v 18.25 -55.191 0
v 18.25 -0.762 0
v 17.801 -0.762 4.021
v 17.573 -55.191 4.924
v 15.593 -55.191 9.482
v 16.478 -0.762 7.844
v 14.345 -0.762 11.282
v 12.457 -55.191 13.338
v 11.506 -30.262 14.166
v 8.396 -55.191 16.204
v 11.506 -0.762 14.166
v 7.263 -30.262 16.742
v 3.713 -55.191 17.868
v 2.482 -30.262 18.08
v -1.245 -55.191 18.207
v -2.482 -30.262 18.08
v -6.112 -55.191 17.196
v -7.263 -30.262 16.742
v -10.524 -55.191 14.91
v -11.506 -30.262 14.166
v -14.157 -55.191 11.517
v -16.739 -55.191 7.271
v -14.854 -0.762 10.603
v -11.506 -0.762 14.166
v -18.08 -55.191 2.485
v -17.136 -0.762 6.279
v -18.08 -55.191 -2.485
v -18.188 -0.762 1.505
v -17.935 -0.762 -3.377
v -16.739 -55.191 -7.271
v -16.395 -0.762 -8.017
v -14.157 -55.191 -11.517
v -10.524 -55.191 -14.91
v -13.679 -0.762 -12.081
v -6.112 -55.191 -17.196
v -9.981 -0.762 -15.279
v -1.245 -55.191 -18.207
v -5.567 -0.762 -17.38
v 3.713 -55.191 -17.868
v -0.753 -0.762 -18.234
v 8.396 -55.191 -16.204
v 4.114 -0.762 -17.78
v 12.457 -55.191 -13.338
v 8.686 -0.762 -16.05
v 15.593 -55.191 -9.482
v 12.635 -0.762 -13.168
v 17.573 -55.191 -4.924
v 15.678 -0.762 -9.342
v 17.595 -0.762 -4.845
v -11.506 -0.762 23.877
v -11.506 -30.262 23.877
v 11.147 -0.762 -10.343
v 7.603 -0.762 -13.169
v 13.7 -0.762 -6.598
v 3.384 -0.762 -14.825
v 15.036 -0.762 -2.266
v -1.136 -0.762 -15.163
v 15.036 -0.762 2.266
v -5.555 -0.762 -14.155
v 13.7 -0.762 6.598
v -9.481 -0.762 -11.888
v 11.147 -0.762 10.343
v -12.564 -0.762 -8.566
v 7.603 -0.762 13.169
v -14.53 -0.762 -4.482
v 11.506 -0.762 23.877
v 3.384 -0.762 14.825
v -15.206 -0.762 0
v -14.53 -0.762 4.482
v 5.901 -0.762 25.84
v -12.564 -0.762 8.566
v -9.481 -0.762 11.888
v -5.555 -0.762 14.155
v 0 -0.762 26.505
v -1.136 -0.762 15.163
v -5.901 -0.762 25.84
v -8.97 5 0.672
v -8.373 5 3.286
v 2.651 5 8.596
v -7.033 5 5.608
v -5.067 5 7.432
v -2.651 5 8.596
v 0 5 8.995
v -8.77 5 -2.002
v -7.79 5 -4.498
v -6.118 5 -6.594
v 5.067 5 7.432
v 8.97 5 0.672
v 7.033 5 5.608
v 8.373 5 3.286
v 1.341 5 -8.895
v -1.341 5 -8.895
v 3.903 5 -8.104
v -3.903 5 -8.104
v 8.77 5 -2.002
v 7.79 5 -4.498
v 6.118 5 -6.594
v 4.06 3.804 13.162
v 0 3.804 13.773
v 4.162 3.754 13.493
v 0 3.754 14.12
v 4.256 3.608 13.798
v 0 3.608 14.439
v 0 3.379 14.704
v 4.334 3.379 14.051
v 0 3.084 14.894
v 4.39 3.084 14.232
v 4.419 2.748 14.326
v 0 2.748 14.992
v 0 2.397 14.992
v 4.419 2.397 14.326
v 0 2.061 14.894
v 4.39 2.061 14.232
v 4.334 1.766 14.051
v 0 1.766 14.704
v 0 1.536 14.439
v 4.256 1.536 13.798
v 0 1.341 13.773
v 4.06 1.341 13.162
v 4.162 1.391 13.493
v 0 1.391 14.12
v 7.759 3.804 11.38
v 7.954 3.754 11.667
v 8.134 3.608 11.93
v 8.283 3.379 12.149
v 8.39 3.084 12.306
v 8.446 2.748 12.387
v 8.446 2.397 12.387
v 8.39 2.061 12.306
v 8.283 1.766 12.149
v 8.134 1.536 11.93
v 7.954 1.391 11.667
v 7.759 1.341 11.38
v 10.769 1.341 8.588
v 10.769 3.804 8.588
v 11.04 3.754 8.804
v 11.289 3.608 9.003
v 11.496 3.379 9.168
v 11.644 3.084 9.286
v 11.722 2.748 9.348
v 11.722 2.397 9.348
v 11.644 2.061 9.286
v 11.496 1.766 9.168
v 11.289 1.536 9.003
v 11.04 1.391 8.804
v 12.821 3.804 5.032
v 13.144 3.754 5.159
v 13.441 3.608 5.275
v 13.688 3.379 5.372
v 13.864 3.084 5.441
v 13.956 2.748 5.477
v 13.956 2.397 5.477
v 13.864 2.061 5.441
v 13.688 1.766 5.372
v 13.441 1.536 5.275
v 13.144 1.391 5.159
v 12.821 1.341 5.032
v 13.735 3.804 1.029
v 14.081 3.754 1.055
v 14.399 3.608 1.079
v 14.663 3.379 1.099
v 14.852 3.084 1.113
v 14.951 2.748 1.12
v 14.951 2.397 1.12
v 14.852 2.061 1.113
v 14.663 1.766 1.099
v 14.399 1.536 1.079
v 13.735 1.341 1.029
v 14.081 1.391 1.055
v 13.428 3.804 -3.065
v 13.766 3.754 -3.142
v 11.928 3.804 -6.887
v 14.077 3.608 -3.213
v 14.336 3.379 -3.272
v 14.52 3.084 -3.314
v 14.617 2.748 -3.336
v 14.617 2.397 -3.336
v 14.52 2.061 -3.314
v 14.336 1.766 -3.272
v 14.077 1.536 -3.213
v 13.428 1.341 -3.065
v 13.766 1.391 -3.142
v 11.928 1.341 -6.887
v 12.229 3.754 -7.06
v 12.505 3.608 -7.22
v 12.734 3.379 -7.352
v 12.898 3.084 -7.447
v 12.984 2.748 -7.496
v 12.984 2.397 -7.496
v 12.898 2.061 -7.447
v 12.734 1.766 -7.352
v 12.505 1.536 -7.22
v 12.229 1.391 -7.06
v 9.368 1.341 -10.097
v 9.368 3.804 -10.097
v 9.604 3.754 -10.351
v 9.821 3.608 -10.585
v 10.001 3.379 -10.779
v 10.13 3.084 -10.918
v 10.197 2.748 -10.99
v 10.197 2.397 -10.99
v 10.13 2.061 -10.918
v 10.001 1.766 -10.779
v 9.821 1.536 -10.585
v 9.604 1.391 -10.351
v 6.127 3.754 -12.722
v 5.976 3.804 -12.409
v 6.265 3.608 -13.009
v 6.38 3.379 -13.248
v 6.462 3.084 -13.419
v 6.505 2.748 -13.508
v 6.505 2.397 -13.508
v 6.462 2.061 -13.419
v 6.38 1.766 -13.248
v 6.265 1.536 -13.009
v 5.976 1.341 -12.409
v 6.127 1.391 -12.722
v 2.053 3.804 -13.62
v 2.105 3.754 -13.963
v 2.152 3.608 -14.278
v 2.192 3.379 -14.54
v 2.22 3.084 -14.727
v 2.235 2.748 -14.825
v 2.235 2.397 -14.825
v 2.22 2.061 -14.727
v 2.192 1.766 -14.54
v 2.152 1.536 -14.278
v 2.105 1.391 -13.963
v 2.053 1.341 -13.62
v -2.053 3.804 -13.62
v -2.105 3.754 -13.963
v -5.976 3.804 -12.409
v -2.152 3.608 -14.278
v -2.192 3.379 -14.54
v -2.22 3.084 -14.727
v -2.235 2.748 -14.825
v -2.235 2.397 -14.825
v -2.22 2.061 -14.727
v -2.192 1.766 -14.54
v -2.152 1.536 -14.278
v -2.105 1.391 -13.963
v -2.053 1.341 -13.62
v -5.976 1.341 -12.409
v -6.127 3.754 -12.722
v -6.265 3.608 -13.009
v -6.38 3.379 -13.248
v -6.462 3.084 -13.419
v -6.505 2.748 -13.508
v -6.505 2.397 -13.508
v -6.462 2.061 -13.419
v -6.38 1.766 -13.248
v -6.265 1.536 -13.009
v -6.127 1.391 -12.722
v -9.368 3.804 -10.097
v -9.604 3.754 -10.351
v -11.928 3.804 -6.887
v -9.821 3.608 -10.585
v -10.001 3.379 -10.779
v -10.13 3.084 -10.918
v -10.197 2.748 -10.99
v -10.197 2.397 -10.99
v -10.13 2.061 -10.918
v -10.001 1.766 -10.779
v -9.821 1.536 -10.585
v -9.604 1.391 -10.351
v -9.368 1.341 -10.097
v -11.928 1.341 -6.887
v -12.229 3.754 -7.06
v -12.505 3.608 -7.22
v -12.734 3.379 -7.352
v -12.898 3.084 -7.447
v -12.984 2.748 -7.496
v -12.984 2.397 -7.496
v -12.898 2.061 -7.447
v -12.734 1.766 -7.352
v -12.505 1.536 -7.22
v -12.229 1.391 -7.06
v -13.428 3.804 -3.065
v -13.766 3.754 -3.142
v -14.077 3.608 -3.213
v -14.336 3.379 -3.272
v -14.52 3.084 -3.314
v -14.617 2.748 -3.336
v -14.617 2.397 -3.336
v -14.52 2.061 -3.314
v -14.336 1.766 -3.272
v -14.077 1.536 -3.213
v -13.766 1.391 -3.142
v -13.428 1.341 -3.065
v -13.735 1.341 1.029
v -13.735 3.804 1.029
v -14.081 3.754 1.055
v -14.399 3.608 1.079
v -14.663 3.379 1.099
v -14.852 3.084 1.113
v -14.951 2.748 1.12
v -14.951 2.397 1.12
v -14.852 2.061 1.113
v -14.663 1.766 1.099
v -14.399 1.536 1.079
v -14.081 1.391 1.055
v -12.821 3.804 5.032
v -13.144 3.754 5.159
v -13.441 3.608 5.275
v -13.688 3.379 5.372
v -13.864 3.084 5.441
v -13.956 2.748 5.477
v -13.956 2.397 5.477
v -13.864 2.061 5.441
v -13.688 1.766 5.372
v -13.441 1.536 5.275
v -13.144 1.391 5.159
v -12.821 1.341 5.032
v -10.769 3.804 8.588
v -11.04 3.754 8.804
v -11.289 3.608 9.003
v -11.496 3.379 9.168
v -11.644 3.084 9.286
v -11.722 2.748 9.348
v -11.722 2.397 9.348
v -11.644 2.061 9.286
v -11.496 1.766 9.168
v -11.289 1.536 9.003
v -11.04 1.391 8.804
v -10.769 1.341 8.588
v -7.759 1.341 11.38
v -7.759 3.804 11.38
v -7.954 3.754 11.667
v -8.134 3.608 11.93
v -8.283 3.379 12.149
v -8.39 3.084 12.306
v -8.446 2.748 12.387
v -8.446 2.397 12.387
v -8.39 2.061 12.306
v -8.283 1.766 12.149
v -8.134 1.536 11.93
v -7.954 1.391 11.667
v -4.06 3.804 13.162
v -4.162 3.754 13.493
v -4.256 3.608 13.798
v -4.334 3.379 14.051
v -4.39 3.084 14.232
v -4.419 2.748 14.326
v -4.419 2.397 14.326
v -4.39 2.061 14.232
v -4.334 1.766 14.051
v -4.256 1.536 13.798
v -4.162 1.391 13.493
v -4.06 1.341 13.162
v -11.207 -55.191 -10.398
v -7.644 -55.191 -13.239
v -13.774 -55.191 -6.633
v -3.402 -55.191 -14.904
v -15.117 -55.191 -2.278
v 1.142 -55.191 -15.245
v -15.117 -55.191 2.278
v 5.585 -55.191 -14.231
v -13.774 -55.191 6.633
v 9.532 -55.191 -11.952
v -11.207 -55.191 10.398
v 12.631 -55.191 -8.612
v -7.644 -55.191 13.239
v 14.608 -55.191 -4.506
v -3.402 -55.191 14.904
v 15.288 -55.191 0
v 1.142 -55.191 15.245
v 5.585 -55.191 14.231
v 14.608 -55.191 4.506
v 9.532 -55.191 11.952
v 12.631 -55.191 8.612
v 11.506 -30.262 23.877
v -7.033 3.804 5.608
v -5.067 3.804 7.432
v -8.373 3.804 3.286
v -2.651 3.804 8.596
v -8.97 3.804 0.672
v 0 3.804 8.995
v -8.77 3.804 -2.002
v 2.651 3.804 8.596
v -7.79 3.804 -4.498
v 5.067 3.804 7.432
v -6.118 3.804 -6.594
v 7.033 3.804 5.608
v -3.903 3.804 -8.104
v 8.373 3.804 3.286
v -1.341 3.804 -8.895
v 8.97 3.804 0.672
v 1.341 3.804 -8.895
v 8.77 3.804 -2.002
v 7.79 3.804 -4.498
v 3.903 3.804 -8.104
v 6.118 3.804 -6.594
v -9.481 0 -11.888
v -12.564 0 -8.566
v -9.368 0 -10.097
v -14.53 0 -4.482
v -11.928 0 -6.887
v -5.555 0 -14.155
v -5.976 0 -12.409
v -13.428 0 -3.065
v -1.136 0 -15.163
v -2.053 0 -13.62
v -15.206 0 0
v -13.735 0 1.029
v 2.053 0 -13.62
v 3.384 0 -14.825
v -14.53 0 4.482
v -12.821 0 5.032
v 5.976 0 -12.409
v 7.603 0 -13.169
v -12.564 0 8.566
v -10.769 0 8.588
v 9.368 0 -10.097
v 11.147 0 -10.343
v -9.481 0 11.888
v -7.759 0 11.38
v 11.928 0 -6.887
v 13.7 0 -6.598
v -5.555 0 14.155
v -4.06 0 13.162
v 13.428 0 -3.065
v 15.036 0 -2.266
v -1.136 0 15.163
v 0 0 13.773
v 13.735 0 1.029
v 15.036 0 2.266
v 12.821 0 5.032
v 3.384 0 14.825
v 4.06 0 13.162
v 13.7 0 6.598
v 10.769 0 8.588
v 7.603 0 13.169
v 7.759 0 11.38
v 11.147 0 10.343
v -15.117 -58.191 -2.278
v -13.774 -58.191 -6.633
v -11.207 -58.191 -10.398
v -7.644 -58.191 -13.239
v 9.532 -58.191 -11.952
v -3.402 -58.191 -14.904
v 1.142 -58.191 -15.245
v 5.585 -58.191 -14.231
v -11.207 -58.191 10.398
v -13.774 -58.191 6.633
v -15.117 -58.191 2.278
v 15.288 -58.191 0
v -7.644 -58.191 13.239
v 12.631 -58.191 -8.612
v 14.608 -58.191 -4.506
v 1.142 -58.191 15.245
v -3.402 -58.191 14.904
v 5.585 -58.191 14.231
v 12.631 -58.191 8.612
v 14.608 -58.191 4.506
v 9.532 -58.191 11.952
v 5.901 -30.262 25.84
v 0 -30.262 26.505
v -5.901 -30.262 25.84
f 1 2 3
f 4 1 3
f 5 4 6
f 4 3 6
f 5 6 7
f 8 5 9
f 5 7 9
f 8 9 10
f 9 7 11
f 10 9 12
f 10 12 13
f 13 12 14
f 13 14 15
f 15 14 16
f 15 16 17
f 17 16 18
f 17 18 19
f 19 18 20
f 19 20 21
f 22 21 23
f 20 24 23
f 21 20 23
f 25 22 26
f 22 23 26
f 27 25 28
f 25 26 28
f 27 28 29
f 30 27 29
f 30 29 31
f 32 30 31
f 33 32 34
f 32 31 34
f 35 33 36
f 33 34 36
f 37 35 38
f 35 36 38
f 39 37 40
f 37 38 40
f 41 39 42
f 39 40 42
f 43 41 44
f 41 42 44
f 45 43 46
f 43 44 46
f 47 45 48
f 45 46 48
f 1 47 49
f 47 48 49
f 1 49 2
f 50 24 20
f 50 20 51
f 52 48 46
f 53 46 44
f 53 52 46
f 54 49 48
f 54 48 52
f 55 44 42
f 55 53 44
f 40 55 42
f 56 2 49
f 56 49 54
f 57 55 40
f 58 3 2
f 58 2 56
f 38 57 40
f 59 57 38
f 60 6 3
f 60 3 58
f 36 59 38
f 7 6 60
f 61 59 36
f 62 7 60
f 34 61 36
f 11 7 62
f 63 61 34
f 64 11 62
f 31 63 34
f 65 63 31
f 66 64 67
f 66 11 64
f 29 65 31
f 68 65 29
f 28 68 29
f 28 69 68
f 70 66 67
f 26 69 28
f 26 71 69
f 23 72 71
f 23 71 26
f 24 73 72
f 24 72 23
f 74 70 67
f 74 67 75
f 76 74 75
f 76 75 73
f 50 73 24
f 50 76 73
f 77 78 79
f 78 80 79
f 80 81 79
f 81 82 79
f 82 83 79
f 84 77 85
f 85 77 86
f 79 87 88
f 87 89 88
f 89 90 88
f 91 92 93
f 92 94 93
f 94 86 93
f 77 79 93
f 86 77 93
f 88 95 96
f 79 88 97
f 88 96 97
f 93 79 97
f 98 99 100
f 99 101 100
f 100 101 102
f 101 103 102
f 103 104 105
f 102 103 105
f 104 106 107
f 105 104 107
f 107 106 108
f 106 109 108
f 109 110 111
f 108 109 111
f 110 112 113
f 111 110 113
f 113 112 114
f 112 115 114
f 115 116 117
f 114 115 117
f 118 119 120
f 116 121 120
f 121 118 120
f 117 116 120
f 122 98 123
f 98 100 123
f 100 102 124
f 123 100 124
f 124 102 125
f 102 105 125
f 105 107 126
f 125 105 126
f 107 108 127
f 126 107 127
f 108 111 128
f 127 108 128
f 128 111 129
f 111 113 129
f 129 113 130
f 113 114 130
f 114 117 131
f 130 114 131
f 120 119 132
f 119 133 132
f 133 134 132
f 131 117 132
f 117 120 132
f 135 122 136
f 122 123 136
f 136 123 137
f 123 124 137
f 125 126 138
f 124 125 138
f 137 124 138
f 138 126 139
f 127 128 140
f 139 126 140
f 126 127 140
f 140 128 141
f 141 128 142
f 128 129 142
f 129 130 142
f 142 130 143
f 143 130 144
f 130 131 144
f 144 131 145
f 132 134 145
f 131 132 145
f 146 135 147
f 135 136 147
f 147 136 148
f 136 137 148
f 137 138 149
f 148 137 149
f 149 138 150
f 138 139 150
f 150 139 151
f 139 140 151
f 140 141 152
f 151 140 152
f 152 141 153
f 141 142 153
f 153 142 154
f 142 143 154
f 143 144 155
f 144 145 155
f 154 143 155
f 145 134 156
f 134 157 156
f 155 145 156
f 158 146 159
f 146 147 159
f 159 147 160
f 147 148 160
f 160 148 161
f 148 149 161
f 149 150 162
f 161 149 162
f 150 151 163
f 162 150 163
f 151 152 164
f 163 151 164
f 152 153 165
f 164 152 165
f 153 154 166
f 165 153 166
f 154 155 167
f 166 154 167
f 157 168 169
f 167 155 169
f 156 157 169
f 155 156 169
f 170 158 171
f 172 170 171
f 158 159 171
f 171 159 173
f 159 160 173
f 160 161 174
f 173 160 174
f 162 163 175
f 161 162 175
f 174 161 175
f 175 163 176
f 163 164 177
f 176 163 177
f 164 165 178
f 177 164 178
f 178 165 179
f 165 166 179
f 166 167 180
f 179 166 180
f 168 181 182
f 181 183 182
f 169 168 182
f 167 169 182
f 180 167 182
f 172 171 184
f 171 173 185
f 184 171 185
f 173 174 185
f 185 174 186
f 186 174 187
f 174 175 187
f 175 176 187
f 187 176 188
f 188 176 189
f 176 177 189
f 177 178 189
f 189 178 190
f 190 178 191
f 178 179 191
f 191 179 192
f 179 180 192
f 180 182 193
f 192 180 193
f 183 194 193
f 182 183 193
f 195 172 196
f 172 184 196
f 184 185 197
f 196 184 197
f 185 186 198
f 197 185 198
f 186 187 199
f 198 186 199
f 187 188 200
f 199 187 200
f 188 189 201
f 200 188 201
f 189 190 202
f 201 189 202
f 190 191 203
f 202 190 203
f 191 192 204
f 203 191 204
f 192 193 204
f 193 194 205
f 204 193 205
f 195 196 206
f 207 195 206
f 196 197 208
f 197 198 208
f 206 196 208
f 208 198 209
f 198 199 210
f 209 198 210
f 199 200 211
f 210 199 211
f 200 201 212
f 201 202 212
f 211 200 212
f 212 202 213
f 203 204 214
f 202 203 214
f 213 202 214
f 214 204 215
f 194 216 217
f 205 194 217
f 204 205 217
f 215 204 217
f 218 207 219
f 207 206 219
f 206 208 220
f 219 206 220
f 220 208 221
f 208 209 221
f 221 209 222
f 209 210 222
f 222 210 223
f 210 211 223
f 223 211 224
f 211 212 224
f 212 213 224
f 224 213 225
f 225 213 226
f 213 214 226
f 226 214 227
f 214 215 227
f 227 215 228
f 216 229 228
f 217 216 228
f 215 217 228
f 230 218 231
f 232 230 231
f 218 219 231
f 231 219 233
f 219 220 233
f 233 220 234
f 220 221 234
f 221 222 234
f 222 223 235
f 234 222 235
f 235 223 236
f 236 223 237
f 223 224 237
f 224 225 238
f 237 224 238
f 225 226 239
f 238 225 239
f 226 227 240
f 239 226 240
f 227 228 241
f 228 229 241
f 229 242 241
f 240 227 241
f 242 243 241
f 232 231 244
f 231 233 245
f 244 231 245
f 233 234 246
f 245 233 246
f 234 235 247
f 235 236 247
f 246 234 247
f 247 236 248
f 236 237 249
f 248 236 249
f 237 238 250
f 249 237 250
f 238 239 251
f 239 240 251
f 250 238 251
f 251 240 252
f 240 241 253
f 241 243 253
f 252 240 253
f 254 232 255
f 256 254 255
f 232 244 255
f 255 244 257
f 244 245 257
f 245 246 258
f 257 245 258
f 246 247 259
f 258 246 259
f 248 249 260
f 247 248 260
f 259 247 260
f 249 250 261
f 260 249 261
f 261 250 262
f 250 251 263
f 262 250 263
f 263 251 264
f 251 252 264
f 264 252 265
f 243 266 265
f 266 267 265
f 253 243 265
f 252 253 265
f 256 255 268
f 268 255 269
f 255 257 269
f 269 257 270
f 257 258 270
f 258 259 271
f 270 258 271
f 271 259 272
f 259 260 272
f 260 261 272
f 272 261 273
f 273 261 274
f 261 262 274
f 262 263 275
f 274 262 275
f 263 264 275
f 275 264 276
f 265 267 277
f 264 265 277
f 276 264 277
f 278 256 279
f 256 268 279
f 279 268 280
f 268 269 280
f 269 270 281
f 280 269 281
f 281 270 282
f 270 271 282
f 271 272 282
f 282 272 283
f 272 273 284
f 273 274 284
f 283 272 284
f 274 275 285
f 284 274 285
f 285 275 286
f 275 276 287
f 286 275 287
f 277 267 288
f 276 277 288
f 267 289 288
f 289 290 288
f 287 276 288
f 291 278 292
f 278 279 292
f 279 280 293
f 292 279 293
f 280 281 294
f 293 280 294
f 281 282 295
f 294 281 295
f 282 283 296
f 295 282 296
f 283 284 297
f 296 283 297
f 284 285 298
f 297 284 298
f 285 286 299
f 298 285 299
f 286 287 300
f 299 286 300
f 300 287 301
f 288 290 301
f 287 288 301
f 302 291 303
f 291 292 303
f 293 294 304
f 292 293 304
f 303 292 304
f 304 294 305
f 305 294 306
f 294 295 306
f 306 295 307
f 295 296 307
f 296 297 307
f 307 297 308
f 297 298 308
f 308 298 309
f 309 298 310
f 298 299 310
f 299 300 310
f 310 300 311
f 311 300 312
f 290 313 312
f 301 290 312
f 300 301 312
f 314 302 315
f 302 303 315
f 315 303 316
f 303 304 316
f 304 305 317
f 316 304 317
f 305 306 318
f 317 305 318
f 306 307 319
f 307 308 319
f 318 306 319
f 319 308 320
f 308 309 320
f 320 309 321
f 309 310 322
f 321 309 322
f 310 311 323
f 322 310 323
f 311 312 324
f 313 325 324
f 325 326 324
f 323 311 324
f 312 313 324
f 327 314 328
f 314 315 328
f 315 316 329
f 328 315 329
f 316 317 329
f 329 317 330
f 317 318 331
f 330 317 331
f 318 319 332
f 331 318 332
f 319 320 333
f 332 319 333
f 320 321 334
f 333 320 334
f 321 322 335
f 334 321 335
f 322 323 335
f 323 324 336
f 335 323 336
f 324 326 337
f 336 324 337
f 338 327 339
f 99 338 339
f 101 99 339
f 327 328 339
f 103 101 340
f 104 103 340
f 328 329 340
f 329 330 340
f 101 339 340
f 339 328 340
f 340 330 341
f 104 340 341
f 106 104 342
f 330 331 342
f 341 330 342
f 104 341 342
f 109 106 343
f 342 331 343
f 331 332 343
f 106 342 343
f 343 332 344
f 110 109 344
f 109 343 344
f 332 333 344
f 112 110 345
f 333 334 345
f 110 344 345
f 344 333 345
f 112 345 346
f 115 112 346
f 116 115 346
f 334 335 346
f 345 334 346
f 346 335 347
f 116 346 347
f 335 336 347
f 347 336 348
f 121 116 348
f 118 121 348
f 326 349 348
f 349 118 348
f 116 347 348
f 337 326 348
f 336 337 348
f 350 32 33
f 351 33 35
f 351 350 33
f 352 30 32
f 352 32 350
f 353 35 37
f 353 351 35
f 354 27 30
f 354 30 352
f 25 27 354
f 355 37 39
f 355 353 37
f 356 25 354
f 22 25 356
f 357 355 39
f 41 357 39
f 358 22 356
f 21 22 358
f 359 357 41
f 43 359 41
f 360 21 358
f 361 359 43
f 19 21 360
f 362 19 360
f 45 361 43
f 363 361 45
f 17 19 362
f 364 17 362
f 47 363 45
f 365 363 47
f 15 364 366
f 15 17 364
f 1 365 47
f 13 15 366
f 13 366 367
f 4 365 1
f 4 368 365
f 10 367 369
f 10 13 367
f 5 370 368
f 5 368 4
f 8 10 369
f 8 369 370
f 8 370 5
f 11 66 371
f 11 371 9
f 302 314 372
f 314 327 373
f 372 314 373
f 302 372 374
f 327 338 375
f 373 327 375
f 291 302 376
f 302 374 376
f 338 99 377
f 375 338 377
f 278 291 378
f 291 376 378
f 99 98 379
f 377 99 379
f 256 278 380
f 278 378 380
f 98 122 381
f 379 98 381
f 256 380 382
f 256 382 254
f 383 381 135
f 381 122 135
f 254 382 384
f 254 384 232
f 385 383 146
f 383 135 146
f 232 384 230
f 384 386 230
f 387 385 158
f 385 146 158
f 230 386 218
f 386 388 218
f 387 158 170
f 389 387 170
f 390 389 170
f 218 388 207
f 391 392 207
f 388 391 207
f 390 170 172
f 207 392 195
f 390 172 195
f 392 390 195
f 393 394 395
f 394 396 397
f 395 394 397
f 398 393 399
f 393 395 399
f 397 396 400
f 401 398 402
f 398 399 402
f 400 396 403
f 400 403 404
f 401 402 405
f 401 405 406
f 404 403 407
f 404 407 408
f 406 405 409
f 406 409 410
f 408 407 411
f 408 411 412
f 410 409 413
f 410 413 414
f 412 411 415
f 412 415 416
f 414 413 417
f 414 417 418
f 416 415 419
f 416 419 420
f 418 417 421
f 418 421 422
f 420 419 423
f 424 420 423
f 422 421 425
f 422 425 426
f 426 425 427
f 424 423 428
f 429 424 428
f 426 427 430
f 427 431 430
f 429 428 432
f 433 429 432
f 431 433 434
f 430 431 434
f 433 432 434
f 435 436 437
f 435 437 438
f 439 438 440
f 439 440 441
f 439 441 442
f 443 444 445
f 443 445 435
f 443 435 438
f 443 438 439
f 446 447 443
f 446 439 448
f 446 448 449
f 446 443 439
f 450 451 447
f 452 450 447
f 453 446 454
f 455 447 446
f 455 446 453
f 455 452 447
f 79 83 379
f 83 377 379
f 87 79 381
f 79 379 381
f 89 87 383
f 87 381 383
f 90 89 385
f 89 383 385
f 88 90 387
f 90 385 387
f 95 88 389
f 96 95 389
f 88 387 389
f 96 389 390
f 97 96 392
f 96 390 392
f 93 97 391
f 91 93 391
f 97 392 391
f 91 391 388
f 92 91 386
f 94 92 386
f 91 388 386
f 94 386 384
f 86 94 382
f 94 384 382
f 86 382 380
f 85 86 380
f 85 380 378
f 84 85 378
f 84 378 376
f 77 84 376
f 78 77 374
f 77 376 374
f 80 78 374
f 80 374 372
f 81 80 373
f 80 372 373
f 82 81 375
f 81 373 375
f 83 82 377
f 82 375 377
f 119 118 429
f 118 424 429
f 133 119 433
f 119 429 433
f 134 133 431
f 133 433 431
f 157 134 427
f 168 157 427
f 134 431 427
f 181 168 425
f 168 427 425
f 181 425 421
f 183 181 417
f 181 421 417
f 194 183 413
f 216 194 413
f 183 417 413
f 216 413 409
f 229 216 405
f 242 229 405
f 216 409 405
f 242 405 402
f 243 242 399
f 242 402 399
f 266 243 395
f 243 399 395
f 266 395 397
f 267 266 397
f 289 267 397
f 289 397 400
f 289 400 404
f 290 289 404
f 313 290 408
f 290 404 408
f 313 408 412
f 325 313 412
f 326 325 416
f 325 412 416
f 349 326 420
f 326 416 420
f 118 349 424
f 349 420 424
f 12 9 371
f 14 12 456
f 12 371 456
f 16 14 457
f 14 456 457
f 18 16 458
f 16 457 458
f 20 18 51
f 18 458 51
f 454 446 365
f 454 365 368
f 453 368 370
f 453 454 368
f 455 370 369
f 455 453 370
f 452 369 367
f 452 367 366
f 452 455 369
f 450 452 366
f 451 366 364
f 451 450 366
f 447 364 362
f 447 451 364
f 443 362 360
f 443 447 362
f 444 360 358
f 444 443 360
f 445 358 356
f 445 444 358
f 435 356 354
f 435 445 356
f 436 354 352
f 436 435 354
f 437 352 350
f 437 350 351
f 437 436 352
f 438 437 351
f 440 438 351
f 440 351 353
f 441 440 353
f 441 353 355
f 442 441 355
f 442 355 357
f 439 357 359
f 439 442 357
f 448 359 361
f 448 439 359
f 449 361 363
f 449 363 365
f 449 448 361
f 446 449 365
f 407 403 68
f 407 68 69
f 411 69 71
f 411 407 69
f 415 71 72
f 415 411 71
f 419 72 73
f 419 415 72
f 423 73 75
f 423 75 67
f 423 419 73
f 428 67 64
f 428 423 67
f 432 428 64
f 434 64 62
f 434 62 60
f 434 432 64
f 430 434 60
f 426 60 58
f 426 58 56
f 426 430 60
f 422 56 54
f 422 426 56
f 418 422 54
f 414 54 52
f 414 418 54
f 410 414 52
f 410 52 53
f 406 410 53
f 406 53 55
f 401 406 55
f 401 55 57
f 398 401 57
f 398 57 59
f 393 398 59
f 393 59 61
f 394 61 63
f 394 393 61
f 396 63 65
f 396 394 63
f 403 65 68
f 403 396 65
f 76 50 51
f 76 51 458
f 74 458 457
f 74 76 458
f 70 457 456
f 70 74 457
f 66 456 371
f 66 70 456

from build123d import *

# Parameters (mm, degrees)
F0_R     = 18.2499
F1_DEPTH = 58.1914
F2_R     = 19.634702
F2_R_2   = 18.2499
F2_R_3   = 15.205931
F3_DEPTH = 0.762
F5_DEPTH = 29.5
F8_R     = 19.976594
F8_R_2   = 18.2499
F8_R_3   = 15.287579
F9_DEPTH = 3


with BuildPart() as f1:
    # F0 (on Front) → F1 (new body)
    with BuildSketch(Plane.XZ):
        Circle(F0_R)
    extrude(amount=F1_DEPTH)

    # F2 (on face) → F3 (cut)
    with BuildSketch(Plane(origin=(0, 0, 0), x_dir=(-1, 0, 0), z_dir=(0, 1, 0))):
        Circle(F2_R)
        Circle(F2_R_2, mode=Mode.SUBTRACT)
        Circle(F2_R_2)
        Circle(F2_R_3, mode=Mode.SUBTRACT)
    extrude(amount=-F3_DEPTH, mode=Mode.SUBTRACT)

    # F4 (on face) → F5 (join)
    with BuildSketch(Plane(origin=(0, -0.762, 0), x_dir=(-1, 0, 0), z_dir=(0, 1, 0))):
        with BuildLine():
            Line((-11.5062, 23.877125), (-11.5062, 14.16567))
            ThreePointArc((-11.5062, 14.16567), (0, 18.2499), (11.5062, 14.16567))
            Line((11.5062, 14.16567), (11.5062, 23.877125))
            ThreePointArc((11.5062, 23.877125), (0, 26.5049), (-11.5062, 23.877125))
        make_face()
    extrude(amount=-F5_DEPTH)

    # F6 (on Right) → F7 (revolve)
    with BuildSketch(Plane.YZ):
        with BuildLine():
            Line((5, 0), (5, 8.995168))
            Line((5, 8.995168), (3.803917, 8.995168))
            Line((3.803917, 8.995168), (3.803917, 13.773475))
            ThreePointArc((3.803917, 13.773475), (2.572395, 15.004997), (1.340872, 13.773475))
            Line((1.340872, 13.773475), (0, 13.773475))
            Line((0, 13.773475), (0, 0))
            Line((0, 0), (5, 0))
        make_face()
    revolve(axis=Axis((0, 0.08472, 0), (0, 1, 0)))

    # F8 (on face) → F9 (cut)
    with BuildSketch(Plane.XZ.offset(58.1914)):
        Circle(F8_R)
        Circle(F8_R_2, mode=Mode.SUBTRACT)
        Circle(F8_R_2)
        Circle(F8_R_3, mode=Mode.SUBTRACT)
    extrude(amount=-F9_DEPTH, mode=Mode.SUBTRACT)


solid = f1.part
